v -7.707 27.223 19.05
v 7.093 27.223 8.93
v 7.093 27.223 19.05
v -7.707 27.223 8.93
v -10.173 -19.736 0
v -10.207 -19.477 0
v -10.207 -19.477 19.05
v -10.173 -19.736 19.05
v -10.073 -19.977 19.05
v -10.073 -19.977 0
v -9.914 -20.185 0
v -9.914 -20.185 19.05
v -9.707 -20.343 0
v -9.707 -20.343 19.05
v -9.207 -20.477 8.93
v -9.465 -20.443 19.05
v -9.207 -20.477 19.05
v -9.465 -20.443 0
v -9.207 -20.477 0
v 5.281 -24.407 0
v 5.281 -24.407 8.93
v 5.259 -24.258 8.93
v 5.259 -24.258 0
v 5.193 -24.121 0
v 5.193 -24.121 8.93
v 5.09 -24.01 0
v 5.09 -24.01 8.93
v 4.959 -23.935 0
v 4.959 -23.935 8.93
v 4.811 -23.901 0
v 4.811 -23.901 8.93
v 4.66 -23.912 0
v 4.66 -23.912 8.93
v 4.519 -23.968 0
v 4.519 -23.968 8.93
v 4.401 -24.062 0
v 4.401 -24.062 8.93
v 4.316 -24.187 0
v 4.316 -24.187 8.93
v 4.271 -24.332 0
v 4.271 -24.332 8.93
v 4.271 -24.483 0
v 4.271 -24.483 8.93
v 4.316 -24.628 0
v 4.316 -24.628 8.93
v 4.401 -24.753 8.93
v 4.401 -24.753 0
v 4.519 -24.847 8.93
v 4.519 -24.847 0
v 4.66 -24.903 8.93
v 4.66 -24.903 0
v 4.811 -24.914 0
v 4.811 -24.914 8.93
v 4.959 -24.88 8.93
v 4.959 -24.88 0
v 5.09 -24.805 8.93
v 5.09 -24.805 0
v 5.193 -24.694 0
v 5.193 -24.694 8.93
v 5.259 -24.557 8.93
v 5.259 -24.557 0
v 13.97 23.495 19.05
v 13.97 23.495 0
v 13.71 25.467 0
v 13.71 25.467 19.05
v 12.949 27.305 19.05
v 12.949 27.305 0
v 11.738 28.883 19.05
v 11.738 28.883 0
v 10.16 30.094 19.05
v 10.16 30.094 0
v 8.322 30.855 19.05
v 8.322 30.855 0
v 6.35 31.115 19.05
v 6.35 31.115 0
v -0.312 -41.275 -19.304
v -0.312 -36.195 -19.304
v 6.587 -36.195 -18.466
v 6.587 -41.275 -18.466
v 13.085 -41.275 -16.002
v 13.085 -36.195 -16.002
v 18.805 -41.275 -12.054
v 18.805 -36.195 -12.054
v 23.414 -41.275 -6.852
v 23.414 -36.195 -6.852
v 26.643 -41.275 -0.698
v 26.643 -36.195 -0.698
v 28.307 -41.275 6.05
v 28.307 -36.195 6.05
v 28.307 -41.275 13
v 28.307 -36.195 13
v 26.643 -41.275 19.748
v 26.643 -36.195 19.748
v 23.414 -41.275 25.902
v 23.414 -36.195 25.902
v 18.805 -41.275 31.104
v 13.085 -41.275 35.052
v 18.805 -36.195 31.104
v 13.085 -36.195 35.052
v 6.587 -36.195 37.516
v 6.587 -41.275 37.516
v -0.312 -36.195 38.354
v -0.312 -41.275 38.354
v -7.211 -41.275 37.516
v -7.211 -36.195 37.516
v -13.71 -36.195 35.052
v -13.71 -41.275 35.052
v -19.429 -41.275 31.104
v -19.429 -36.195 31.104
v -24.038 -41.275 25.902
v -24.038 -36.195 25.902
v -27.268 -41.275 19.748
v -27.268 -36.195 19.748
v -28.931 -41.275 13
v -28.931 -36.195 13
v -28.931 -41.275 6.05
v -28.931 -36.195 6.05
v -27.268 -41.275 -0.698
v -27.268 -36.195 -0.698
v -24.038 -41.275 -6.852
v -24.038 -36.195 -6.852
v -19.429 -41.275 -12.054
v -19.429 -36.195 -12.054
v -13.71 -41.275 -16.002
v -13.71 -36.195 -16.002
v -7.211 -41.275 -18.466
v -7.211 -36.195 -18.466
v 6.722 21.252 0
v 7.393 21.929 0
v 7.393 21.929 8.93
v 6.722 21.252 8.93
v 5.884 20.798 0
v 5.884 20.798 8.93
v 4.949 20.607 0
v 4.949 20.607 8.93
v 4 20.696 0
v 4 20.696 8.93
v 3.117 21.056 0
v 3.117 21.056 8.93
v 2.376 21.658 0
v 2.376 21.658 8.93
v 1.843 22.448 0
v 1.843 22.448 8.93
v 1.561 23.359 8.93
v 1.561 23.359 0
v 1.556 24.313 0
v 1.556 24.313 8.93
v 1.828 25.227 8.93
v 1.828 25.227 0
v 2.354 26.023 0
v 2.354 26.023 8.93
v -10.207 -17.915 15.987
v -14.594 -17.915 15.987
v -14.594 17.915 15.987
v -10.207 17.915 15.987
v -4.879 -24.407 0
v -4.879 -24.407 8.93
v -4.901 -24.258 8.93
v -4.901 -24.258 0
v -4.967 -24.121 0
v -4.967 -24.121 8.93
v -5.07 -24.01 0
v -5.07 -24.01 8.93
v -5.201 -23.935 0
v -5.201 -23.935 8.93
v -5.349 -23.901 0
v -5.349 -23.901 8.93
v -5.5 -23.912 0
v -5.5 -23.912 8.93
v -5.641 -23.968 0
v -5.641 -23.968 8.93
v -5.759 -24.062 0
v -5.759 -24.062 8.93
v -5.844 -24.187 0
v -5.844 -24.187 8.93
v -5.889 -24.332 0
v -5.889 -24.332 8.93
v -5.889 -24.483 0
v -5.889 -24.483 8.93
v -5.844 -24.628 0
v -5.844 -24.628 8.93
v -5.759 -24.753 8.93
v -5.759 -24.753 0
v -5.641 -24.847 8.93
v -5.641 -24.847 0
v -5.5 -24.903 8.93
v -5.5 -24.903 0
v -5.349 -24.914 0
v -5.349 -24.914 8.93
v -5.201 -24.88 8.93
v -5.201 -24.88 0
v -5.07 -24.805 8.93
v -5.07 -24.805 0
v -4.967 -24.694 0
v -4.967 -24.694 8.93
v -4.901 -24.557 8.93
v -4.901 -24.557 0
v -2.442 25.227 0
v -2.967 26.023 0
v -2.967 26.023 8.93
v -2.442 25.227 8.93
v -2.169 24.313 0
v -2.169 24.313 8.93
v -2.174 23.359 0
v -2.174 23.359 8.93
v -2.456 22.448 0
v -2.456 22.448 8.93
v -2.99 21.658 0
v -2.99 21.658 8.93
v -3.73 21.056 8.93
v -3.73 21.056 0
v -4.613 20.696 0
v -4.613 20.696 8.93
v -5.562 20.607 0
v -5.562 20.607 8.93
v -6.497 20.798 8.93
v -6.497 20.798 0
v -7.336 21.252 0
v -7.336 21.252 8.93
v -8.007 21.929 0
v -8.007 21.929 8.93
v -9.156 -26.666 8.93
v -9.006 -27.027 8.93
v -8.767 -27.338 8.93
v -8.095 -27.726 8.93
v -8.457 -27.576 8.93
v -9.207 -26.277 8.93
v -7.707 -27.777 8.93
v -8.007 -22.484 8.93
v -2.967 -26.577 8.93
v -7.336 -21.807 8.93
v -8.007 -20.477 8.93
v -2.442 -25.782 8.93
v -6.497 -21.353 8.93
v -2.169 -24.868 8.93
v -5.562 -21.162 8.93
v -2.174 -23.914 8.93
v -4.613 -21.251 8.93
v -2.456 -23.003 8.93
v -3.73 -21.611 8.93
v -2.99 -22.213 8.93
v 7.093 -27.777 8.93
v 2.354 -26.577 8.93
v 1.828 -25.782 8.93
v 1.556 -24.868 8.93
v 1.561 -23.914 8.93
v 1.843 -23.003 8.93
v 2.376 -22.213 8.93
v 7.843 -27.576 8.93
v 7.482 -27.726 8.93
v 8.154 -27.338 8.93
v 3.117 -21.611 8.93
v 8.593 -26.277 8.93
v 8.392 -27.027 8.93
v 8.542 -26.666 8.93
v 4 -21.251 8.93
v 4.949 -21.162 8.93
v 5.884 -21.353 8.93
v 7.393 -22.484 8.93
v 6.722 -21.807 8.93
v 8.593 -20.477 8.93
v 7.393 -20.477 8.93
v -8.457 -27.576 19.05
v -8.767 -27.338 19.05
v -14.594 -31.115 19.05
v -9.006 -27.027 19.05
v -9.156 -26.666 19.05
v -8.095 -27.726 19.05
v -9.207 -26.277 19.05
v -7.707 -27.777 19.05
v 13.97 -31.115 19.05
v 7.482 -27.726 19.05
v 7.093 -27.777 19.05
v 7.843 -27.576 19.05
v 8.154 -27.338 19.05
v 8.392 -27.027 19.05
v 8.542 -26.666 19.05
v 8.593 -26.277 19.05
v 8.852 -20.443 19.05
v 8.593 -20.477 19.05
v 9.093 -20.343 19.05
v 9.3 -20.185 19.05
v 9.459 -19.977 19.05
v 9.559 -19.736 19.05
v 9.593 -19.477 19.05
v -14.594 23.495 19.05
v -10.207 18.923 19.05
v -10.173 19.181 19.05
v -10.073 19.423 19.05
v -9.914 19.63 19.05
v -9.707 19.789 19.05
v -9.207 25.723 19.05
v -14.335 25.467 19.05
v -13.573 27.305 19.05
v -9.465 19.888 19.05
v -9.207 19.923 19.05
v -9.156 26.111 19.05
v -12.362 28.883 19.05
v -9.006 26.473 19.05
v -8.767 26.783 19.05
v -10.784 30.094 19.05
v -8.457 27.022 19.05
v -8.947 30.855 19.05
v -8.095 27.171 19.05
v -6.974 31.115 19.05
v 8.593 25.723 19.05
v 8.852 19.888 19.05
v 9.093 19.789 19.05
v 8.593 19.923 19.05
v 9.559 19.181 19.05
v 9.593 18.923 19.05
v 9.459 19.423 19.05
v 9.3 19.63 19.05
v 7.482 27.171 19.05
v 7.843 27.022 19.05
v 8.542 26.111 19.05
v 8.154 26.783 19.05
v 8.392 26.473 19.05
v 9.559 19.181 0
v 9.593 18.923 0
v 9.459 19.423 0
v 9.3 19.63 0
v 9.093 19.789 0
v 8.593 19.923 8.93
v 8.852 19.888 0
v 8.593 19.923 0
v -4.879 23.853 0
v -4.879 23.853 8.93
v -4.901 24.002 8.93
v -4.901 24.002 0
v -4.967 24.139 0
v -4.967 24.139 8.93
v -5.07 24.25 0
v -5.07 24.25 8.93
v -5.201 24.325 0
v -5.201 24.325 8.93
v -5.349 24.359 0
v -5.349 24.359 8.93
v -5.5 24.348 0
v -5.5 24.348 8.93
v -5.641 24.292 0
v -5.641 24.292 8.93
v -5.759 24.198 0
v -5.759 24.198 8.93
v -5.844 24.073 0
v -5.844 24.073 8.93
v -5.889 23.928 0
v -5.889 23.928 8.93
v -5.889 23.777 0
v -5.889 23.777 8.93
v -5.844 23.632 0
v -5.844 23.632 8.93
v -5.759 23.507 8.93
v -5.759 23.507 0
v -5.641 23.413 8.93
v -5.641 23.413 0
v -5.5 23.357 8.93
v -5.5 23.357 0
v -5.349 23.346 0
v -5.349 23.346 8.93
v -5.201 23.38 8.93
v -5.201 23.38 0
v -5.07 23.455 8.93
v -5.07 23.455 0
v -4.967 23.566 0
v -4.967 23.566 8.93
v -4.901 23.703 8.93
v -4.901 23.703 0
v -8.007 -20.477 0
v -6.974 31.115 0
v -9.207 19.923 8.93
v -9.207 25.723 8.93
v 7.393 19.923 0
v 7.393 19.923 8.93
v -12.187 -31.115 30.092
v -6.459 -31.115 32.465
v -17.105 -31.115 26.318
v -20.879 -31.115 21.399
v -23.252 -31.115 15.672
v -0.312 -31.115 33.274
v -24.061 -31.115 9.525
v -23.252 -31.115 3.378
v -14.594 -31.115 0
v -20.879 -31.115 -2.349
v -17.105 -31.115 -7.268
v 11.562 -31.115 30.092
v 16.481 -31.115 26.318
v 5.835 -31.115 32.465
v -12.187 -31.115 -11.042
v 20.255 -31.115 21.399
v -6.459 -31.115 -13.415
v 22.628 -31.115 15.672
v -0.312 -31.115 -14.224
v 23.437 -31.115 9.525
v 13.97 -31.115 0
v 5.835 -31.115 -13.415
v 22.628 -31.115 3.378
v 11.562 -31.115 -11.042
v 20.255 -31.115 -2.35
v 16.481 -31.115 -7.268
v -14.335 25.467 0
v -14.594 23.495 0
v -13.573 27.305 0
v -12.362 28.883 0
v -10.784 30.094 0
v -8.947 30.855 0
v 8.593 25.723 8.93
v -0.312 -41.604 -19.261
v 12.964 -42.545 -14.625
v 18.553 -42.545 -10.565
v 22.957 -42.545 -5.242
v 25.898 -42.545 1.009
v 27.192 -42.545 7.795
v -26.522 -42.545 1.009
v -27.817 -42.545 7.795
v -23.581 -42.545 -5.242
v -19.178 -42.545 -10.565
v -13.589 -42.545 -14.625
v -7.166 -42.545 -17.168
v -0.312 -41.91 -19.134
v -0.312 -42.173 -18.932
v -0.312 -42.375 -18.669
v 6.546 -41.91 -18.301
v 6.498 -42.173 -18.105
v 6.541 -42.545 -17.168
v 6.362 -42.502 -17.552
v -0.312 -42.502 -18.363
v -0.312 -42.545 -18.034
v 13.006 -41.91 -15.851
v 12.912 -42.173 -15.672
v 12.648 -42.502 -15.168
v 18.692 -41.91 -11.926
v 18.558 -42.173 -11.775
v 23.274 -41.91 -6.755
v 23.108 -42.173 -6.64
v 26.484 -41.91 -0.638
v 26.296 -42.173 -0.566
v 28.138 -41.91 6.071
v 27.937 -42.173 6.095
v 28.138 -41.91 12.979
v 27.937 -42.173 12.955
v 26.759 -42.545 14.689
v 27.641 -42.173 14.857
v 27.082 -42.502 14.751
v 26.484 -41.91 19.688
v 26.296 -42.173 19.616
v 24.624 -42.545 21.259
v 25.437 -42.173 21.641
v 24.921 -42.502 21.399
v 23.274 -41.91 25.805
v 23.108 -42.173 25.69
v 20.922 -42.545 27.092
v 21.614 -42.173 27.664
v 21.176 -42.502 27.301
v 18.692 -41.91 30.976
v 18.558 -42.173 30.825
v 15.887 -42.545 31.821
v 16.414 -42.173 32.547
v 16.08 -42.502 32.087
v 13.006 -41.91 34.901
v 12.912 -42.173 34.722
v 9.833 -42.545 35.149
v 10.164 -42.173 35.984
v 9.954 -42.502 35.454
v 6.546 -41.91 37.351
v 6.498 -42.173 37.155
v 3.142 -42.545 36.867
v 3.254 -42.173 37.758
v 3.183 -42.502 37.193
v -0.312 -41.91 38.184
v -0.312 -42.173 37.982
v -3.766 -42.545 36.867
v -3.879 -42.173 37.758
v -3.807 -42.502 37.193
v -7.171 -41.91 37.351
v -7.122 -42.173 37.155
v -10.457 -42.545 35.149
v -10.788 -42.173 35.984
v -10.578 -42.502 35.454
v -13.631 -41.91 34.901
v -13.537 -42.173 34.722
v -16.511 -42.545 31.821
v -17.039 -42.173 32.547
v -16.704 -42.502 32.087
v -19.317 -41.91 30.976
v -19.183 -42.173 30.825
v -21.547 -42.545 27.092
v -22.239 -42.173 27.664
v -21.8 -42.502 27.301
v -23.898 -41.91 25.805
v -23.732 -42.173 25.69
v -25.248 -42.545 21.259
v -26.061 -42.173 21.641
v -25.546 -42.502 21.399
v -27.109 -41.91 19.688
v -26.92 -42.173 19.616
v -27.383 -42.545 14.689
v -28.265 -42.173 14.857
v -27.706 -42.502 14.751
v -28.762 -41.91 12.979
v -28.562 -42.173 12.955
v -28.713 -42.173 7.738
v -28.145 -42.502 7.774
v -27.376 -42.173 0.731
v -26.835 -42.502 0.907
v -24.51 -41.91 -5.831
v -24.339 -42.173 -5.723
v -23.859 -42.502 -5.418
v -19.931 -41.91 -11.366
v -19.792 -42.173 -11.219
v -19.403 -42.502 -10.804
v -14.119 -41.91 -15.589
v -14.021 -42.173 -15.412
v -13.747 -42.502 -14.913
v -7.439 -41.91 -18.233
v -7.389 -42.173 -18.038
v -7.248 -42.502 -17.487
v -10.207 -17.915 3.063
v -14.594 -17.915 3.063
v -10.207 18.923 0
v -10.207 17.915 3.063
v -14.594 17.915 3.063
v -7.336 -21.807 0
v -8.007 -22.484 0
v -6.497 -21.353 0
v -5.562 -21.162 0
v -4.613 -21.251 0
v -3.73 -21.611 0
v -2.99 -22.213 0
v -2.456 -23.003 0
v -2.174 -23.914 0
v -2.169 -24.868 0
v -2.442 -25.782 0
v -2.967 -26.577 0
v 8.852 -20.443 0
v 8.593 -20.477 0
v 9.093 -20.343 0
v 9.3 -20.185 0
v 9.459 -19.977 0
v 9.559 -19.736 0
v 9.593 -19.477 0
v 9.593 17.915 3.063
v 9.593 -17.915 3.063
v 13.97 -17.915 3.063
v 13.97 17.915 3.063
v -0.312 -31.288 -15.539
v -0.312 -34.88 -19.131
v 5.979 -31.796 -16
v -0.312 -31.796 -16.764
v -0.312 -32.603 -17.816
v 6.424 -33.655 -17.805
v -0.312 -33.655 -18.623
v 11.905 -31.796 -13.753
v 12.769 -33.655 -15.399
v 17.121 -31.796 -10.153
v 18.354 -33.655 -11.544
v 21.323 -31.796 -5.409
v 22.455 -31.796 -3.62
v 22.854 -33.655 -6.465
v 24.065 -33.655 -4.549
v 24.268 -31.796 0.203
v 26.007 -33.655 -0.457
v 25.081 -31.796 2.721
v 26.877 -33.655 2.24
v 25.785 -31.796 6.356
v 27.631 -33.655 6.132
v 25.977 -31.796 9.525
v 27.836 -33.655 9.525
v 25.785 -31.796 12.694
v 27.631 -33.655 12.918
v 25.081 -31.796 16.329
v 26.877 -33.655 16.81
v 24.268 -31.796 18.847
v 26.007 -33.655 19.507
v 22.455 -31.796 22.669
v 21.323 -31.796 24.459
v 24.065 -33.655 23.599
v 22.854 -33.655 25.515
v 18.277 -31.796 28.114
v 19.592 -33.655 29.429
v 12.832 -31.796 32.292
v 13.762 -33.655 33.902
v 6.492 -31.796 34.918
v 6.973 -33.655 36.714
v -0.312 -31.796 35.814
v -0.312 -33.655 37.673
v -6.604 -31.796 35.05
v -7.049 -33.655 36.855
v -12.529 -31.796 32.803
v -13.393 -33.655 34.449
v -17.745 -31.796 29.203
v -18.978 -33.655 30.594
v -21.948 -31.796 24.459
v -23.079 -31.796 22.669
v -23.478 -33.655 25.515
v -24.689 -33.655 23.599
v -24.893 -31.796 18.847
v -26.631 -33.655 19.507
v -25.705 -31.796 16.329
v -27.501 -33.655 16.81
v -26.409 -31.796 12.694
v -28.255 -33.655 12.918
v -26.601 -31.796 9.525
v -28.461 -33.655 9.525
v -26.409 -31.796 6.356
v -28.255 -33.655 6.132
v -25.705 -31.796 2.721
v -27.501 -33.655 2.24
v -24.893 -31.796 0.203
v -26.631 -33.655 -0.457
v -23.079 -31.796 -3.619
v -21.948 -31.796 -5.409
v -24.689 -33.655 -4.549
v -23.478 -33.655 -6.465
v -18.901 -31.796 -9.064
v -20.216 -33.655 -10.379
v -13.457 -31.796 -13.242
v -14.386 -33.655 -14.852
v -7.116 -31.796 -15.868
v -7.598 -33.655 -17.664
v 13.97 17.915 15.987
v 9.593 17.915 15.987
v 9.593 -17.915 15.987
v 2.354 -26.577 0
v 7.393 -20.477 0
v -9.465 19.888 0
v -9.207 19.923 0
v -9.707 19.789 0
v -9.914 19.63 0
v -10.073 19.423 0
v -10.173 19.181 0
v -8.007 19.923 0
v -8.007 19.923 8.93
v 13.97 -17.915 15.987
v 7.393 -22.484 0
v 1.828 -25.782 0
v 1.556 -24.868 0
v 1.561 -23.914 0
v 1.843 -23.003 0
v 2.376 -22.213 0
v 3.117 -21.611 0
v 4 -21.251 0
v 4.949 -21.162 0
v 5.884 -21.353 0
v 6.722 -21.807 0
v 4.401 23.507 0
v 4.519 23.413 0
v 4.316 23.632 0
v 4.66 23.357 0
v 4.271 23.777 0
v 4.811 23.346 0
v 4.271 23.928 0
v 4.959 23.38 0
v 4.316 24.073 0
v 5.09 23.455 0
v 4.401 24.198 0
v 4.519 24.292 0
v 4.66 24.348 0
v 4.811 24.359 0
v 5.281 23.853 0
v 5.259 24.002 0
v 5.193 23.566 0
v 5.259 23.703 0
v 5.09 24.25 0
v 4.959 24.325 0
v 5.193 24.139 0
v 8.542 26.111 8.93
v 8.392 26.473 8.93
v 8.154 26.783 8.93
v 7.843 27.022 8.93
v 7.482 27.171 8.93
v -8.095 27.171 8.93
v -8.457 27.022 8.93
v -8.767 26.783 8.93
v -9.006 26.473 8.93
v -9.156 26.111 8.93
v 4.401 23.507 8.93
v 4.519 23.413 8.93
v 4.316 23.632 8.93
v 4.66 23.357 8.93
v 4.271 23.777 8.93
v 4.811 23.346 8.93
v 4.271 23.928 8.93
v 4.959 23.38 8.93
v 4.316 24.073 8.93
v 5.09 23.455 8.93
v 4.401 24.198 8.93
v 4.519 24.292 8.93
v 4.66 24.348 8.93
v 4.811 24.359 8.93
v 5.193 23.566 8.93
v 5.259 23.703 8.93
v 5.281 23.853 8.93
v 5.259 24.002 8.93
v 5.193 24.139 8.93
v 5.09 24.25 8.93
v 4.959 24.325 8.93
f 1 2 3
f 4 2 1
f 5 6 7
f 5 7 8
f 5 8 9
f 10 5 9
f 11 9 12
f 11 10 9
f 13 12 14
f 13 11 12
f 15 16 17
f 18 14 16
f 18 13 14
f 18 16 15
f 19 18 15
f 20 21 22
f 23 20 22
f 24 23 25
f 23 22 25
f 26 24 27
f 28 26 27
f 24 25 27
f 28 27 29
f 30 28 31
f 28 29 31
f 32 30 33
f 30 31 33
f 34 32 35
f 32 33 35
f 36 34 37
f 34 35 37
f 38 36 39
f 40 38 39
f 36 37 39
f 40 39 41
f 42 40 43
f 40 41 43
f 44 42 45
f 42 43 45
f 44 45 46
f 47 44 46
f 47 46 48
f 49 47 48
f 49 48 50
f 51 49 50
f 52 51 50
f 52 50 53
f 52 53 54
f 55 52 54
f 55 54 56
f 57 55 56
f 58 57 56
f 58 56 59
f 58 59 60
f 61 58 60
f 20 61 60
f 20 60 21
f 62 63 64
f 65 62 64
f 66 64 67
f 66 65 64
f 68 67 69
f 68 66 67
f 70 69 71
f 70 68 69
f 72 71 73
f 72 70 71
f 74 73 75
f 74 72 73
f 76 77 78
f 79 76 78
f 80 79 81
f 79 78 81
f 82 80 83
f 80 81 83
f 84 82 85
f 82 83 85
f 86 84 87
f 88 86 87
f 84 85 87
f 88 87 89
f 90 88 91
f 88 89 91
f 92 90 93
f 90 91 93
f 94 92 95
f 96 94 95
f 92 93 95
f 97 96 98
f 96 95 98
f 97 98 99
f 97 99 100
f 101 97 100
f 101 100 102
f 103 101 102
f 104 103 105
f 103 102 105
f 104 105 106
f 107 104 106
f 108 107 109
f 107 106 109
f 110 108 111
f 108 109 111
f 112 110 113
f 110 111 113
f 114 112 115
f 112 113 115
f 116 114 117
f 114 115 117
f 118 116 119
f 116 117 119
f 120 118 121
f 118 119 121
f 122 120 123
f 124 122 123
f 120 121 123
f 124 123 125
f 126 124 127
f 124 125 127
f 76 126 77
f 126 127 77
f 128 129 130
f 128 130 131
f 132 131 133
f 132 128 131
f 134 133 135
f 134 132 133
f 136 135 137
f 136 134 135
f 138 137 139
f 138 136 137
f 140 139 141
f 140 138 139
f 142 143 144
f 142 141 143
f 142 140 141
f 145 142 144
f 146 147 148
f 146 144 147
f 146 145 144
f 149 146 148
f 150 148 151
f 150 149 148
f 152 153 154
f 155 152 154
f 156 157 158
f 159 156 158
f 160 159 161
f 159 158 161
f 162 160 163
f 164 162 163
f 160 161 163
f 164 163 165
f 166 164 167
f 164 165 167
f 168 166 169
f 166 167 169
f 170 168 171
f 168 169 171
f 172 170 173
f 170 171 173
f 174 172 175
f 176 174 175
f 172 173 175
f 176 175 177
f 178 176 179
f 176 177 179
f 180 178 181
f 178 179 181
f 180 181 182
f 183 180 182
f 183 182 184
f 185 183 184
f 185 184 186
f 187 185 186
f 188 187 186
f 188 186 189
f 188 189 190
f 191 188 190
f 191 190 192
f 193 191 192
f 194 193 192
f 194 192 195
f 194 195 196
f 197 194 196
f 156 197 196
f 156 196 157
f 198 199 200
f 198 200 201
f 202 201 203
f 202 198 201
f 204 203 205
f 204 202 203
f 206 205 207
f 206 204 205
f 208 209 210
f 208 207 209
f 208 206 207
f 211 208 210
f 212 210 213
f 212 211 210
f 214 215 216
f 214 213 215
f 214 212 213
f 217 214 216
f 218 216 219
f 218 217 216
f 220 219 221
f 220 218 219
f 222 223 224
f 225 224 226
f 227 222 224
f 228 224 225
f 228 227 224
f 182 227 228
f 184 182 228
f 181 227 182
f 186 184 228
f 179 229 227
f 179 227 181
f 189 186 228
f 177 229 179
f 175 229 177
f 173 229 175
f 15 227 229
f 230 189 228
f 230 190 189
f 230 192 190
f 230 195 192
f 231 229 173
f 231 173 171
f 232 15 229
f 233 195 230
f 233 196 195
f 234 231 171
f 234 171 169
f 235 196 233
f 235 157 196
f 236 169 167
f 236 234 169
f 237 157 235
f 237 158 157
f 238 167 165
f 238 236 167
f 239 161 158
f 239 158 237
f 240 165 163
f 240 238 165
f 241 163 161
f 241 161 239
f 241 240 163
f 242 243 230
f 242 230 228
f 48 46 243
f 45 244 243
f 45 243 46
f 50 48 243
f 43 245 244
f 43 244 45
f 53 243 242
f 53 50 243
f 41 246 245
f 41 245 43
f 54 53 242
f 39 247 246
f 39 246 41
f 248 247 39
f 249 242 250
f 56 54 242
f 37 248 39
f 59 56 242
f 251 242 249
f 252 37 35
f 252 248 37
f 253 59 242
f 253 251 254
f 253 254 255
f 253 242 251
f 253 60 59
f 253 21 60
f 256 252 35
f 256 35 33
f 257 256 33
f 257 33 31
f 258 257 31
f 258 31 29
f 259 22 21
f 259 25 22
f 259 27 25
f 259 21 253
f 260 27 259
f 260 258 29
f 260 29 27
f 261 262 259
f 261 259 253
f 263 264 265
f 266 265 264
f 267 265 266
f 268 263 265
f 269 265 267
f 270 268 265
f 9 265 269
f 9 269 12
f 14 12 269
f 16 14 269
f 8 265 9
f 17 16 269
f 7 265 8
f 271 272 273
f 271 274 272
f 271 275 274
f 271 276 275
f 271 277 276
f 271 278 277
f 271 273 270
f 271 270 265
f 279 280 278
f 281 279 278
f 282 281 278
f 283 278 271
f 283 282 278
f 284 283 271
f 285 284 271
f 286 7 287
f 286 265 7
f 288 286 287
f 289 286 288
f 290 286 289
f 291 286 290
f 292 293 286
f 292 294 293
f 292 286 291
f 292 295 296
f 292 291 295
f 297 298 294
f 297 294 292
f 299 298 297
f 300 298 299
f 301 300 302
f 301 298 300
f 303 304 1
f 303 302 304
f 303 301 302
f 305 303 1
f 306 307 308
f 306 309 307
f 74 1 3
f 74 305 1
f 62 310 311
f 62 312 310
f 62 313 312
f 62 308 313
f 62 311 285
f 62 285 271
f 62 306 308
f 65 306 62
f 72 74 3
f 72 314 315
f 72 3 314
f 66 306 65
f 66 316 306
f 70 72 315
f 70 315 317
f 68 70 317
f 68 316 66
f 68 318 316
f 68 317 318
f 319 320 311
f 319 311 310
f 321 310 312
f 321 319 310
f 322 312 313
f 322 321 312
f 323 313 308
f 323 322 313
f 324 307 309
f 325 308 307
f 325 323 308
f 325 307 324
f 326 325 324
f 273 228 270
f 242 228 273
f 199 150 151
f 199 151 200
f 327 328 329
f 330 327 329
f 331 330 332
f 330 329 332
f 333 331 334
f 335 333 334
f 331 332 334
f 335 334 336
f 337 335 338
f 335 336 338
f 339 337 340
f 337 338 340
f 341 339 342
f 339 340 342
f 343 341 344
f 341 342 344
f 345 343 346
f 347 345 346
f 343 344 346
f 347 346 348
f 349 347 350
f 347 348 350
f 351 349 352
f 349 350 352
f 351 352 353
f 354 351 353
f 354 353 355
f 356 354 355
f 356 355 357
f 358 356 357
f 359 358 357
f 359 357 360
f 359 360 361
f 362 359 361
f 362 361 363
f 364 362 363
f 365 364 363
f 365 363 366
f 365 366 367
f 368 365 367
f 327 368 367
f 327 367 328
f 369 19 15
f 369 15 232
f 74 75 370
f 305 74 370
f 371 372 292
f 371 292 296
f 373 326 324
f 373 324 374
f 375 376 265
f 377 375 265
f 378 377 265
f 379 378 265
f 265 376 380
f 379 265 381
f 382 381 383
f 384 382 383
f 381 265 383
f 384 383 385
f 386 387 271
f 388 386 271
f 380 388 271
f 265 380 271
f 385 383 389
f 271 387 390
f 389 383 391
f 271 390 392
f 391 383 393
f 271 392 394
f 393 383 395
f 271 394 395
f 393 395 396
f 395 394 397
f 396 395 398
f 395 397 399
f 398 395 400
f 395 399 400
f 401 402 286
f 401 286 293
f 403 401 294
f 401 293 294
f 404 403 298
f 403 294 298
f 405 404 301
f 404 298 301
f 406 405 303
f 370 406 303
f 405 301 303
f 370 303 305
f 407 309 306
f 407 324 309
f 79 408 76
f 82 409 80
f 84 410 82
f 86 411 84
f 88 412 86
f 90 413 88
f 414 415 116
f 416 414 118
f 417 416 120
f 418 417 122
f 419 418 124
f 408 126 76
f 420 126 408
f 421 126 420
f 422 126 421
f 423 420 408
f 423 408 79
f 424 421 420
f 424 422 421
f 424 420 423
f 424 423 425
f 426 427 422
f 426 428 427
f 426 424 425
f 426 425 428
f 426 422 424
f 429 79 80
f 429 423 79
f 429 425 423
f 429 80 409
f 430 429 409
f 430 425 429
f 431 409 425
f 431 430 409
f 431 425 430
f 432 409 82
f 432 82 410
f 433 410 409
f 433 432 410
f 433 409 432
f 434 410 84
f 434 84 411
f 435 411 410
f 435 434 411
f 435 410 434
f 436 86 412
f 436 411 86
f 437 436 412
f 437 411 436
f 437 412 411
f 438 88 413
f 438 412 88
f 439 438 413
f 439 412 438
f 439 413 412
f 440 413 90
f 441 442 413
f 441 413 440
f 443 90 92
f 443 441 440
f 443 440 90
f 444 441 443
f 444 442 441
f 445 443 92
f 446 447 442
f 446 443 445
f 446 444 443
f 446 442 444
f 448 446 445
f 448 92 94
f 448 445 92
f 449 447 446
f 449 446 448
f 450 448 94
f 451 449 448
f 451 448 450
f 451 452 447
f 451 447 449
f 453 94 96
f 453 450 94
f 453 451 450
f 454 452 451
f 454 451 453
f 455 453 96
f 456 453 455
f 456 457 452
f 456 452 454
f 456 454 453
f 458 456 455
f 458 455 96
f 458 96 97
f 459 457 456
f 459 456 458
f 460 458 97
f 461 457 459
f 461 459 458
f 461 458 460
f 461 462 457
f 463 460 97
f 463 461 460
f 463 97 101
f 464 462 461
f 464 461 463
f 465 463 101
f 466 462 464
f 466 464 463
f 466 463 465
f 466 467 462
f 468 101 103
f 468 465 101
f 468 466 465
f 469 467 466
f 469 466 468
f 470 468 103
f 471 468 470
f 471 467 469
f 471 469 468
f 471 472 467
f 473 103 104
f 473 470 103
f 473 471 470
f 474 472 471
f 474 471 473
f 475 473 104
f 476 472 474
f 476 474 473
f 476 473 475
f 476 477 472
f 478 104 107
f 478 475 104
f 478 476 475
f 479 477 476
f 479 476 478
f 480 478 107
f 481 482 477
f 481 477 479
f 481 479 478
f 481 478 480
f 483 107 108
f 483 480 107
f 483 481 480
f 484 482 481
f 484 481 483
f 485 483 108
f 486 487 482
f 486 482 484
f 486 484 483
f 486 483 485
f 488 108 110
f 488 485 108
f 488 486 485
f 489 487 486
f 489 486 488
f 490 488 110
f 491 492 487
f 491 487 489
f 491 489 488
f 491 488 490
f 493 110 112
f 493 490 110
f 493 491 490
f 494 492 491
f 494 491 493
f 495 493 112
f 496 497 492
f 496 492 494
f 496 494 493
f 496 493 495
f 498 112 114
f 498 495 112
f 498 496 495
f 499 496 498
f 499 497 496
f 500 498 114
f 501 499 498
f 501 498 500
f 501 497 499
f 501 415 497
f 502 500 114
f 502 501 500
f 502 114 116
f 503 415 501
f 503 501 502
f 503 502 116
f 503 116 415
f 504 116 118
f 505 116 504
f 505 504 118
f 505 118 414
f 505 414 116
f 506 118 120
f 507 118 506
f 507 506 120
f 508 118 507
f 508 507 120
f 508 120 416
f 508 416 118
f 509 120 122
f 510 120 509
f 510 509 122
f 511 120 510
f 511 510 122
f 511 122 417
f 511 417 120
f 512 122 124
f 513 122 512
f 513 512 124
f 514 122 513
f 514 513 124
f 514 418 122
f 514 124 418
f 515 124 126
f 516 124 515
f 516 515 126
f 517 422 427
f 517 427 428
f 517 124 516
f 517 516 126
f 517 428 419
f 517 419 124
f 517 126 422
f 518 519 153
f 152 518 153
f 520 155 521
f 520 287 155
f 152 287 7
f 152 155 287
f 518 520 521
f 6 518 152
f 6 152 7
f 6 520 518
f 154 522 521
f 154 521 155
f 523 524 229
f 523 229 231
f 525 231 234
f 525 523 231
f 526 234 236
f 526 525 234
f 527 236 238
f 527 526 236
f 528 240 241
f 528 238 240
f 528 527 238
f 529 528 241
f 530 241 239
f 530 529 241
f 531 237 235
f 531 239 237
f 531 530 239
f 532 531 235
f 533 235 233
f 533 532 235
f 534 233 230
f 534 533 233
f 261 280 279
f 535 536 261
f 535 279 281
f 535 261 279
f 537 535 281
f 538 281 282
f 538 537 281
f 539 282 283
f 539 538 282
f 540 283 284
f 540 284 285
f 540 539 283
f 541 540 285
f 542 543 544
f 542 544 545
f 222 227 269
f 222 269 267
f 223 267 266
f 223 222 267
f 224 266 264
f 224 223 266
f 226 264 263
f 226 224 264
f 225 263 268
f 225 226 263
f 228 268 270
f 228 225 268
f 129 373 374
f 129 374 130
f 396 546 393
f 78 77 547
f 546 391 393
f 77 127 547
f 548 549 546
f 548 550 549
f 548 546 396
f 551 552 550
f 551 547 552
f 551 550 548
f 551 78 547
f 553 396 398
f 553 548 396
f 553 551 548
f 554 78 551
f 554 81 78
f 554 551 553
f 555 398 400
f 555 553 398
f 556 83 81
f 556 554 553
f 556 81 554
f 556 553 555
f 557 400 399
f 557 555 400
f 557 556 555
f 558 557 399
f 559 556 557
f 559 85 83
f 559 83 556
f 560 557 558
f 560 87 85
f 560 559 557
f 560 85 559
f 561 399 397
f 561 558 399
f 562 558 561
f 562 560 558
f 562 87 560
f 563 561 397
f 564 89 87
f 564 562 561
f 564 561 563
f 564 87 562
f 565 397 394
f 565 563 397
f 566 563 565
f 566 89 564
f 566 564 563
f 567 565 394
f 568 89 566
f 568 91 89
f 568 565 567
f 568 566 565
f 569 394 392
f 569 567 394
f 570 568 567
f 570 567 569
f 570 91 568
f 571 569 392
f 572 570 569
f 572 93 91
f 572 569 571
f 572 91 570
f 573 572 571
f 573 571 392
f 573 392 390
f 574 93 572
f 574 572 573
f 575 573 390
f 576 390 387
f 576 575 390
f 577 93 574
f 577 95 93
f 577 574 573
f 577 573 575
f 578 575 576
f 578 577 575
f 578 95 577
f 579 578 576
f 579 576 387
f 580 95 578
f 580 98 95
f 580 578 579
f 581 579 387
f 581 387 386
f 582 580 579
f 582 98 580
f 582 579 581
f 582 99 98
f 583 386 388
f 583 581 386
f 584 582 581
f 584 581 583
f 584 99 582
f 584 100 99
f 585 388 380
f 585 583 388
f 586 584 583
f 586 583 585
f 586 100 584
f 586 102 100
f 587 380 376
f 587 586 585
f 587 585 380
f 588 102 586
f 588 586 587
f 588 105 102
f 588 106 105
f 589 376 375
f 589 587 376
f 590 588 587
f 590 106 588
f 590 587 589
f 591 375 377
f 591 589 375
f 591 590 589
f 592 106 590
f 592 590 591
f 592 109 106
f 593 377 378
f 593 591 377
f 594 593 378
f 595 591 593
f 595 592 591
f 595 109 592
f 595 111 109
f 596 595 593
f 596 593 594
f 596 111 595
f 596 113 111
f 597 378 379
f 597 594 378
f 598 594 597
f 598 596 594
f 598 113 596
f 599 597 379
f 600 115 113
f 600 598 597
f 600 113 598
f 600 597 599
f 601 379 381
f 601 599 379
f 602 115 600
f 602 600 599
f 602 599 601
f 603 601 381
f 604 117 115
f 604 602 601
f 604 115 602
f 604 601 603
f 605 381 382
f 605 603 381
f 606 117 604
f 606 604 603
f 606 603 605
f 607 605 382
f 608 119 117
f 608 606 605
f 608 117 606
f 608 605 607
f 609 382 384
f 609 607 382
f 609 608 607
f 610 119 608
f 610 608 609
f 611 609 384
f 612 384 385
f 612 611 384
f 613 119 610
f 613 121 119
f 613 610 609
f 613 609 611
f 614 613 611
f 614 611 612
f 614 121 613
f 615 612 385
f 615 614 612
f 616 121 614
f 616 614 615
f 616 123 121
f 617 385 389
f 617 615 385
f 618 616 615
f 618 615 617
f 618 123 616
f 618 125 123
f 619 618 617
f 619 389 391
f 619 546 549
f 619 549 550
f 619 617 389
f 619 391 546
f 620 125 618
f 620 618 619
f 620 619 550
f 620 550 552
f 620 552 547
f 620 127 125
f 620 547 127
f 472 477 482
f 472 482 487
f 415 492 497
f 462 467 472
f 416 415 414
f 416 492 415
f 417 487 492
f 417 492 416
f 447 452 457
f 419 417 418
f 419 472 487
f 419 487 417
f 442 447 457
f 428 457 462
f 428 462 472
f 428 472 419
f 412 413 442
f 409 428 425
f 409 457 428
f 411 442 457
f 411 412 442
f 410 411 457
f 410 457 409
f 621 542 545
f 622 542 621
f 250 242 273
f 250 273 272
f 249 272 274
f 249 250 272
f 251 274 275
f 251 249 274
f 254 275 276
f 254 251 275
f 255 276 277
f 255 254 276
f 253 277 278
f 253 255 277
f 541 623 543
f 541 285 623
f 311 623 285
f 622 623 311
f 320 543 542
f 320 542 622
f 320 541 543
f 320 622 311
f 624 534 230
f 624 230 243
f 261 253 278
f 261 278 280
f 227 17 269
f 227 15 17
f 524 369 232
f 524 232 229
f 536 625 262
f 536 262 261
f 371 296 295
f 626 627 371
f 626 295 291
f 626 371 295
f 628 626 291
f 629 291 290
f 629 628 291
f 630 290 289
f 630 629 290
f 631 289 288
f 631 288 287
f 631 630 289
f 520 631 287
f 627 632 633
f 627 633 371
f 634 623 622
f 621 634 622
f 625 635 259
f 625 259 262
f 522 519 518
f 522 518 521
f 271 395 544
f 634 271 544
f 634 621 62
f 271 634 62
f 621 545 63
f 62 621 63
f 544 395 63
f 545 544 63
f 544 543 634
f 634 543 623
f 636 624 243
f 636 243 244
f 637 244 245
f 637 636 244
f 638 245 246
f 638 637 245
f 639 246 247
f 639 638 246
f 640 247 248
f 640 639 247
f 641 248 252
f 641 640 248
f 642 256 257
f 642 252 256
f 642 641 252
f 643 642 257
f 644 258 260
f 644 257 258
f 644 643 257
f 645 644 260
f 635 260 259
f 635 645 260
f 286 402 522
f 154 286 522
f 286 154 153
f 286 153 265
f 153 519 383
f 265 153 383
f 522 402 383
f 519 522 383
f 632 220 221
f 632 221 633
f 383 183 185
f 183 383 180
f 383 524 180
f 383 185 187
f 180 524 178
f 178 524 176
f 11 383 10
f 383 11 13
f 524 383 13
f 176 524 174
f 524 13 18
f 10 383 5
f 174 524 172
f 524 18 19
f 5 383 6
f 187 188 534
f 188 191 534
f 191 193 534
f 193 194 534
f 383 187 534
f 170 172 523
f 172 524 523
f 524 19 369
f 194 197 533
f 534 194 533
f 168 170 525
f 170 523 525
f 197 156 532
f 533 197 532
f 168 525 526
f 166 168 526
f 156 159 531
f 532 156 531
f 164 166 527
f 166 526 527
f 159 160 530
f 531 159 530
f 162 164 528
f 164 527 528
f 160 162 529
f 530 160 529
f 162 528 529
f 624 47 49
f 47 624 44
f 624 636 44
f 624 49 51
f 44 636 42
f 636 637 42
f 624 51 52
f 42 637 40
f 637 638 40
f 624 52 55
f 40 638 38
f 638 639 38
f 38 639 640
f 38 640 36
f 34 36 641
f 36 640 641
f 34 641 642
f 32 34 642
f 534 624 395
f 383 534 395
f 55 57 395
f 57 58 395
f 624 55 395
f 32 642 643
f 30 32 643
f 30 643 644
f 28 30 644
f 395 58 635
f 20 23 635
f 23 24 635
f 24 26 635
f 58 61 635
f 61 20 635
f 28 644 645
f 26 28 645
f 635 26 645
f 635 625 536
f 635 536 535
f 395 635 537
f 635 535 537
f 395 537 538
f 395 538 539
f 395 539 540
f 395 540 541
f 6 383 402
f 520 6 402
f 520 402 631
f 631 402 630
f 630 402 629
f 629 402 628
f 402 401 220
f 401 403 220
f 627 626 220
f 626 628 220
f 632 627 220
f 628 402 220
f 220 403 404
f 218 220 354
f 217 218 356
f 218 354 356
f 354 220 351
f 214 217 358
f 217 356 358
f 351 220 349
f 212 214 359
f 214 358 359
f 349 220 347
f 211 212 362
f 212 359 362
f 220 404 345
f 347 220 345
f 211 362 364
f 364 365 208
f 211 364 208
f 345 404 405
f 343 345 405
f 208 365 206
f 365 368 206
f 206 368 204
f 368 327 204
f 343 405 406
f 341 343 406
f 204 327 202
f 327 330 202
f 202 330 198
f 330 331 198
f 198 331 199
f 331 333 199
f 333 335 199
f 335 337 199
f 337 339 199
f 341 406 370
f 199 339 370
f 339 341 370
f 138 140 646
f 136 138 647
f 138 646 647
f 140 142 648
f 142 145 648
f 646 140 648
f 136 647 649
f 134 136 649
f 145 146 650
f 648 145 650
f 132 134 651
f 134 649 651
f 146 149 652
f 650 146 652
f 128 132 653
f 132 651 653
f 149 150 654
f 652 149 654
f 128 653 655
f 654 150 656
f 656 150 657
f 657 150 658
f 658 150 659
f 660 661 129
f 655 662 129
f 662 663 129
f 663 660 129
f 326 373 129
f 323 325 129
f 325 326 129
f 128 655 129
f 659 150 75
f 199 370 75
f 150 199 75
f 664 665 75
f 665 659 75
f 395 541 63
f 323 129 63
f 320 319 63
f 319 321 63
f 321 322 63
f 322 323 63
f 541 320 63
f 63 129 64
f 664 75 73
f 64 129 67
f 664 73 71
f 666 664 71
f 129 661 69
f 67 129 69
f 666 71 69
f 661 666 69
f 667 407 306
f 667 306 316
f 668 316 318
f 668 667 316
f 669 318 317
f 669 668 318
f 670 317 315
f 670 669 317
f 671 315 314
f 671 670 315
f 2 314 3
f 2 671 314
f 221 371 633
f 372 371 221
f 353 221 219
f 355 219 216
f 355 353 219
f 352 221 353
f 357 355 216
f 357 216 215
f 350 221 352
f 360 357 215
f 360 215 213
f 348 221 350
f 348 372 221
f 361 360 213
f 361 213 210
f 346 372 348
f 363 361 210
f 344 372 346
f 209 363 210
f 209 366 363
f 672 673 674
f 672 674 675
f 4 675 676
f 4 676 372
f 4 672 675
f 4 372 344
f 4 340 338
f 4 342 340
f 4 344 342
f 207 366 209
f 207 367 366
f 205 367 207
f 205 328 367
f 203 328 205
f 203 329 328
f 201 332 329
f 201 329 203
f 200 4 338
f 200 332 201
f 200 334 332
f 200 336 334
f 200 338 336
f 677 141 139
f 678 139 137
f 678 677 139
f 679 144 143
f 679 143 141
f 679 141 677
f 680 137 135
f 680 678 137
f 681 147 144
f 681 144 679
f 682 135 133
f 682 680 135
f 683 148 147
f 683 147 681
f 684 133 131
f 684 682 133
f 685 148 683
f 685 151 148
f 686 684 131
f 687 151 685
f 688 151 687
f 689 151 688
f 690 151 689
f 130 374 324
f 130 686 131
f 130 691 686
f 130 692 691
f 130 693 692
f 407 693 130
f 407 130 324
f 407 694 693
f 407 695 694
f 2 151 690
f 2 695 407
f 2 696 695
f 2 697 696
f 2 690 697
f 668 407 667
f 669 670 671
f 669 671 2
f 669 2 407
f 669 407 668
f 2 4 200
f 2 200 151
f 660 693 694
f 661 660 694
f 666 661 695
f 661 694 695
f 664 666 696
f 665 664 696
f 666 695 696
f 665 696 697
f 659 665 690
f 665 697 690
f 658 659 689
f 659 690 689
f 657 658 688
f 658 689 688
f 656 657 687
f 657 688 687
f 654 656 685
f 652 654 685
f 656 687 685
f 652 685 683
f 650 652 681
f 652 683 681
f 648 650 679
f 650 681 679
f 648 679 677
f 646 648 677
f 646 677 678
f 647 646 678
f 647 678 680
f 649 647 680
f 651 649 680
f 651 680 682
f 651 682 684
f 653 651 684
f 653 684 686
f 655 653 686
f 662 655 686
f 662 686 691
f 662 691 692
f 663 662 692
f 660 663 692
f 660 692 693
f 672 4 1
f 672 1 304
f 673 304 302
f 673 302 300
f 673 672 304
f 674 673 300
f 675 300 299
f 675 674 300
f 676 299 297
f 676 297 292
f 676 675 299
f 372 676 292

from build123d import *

# Parameters (mm, degrees)
BOSS_EXTRUDE1_DEPTH   = 19.05
SKETCH2_R             = 28.829
BOSS_EXTRUDE3_DEPTH   = 11.43
FILLET1_R             = 7.62
FILLET2_R             = 5.08
FILLET3_R             = 1.27
CAVITY4_OUTLINE_R     = 0.5
CAVITY4_DEPTH         = 19.05
CAVITY4_START         = 16.55
CAVITY4_2_OUTLINE_R   = 2.25
CAVITY4_2_OUTLINE_R_2 = 0.5
CAVITY4_2_DEPTH       = 2.5
CAVITY4_START_2       = 18.05
CAVITY4_3_DEPTH       = 1
CAVITY4_START_3       = 5.35
CAVITY4_4_OUTLINE_R   = 0.5
CAVITY4_4_DEPTH       = 11.2
CUT_EXTRUDE2_DEPTH    = 25.4
CUT_EXTRUDE3_START    = -19.558
CUT_EXTRUDE3_DEPTH    = 19.558
SKETCH6_R             = 2.25
BOSS_EXTRUDE4_DEPTH   = 2.54
SKETCH7_W             = 12.923913796
SKETCH7_H             = 35.830978878
CUT_EXTRUDE4_DEPTH    = 33.02
CUT_EXTRUDE6_START    = -5.08
SKETCH8_R             = 2.25
CUT_EXTRUDE6_DEPTH    = 5.08
SKETCH9_R             = 0.508
CUT_EXTRUDE7_DEPTH    = 17.78
CUT_EXTRUDE8_START    = -7.62
CUT_EXTRUDE8_DEPTH    = 7.62


# Read off the part's stored shape, not the designer's step: Cavity4
with BuildPart() as part:
    # Sketch1 → Boss-Extrude1 (new body)
    with BuildSketch(Plane.XY):
        Polygon((0, -31.115), (13.97, -31.115), (13.97, 0), (13.97, 31.115), (-0.624344695, 31.115), (-14.594344695, 31.115), (-14.594344695, 0), (-14.594344695, -31.115), align=None)
    extrude(amount=BOSS_EXTRUDE1_DEPTH)

    # Sketch2 → Boss-Extrude3 (add)
    with BuildSketch(Plane.XZ.offset(31.115)):
        with Locations(Location((-0.312172348, 9.525, 0), (0, 0, 270))):
            Circle(SKETCH2_R)
    extrude(amount=BOSS_EXTRUDE3_DEPTH)

    # Fillet1
    fillet1_edges = [part.edges().sort_by_distance(p)[0] for p in [
        (-14.594344695, 31.115, 9.525),
        (13.97, 31.115, 9.525),
    ]]
    fillet(fillet1_edges, radius=FILLET1_R)

    # Fillet2
    fillet2_edges = [part.edges().sort_by_distance(p)[0] for p in [
        (-0.312172348, -31.115, 38.354),
    ]]
    fillet(fillet2_edges, radius=FILLET2_R)

    # Fillet3
    fillet3_edges = [part.edges().sort_by_distance(p)[0] for p in [
        (-0.312172348, -42.545, 38.354),
    ]]
    fillet(fillet3_edges, radius=FILLET3_R)

    # Cavity4 outline → Cavity4 (cut)
    with BuildSketch(Plane.XY):
        with BuildLine():
            Line((8.593365051, 19.922544312), (-9.206634949, 19.922544312))
            ThreePointArc((-9.206634949, 19.922544312), (-9.91374173, 19.629651093), (-10.206634949, 18.922544312))
            Line((-10.206634949, 18.922544312), (-10.206634949, -19.477455688))
            ThreePointArc((-10.206634949, -19.477455688), (-9.91374173, -20.184562469), (-9.206634949, -20.477455688))
            Line((-9.206634949, -20.477455688), (8.593365051, -20.477455688))
            ThreePointArc((8.593365051, -20.477455688), (9.300471832, -20.184562469), (9.593365051, -19.477455688))
            Line((9.593365051, -19.477455688), (9.593365051, 18.922544312))
            ThreePointArc((9.593365051, 18.922544312), (9.300471832, 19.629651094), (8.593365051, 19.922544312))
        make_face()
        with Locations((-9.206634949, -19.477455688)):
            Circle(CAVITY4_OUTLINE_R, mode=Mode.SUBTRACT)
        with Locations((8.593365051, -19.477455688)):
            Circle(CAVITY4_OUTLINE_R, mode=Mode.SUBTRACT)
        with Locations((-9.206634949, 18.922544312)):
            Circle(CAVITY4_OUTLINE_R, mode=Mode.SUBTRACT)
        with Locations((8.593365051, 18.922544312)):
            Circle(CAVITY4_OUTLINE_R, mode=Mode.SUBTRACT)
    extrude(amount=CAVITY4_DEPTH, mode=Mode.SUBTRACT)

    # Cavity4 2 outline → Cavity4 2 (cut)
    # profile 1 of 6: a face of its own
    with BuildSketch(Plane.XY.offset(CAVITY4_START)):
        with BuildLine():
            ThreePointArc((-8.006634949, 21.929499851), (-3.337656866, 21.329809919), (-2.96721353, 26.022544312))
            Line((-2.96721353, 26.022544312), (2.353943633, 26.022544312))
            ThreePointArc((2.353943633, 26.022544312), (2.724386969, 21.329809919), (7.393365051, 21.929499851))
            Line((7.393365051, 21.929499851), (7.393365051, 19.922544312))
            Line((7.393365051, 19.922544312), (8.593365051, 19.922544312))
            Line((8.593365051, 19.922544312), (8.593365051, 25.722544312))
            ThreePointArc((8.593365051, 25.722544312), (8.154025223, 26.783204484), (7.093365051, 27.222544312))
            Line((7.093365051, 27.222544312), (-7.706634949, 27.222544312))
            ThreePointArc((-7.706634949, 27.222544312), (-8.76729512, 26.783204484), (-9.206634949, 25.722544312))
            Line((-9.206634949, 25.722544312), (-9.206634949, 19.922544312))
            Line((-9.206634949, 19.922544312), (-8.006634949, 19.922544312))
            Line((-8.006634949, 19.922544312), (-8.006634949, 21.929499851))
        make_face()
        with Locations((-5.386634949, 23.852544312)):
            Circle(CAVITY4_2_OUTLINE_R, mode=Mode.SUBTRACT)
        with Locations((4.773365051, 23.852544312)):
            Circle(CAVITY4_2_OUTLINE_R, mode=Mode.SUBTRACT)
    # profile 2 of 6: a face of its own
    with BuildSketch(Plane.XY.offset(CAVITY4_START)):
        with BuildLine():
            Line((-8.006634949, -20.477455688), (-9.206634949, -20.477455688))
            Line((-9.206634949, -20.477455688), (-9.206634949, -26.277455688))
            ThreePointArc((-9.206634949, -26.277455688), (-8.76729512, -27.33811586), (-7.706634949, -27.777455688))
            Line((-7.706634949, -27.777455688), (7.093365051, -27.777455688))
            ThreePointArc((7.093365051, -27.777455688), (8.154025223, -27.33811586), (8.593365051, -26.277455688))
            Line((8.593365051, -26.277455688), (8.593365051, -20.477455688))
            Line((8.593365051, -20.477455688), (7.393365051, -20.477455688))
            Line((7.393365051, -20.477455688), (7.393365051, -22.484411227))
            ThreePointArc((7.393365051, -22.484411227), (2.724386969, -21.884721295), (2.353943633, -26.577455688))
            Line((2.353943633, -26.577455688), (-2.96721353, -26.577455688))
            ThreePointArc((-2.96721353, -26.577455688), (-3.337656866, -21.884721295), (-8.006634949, -22.484411227))
            Line((-8.006634949, -22.484411227), (-8.006634949, -20.477455688))
        make_face()
        with Locations((-5.386634949, -24.407455688)):
            Circle(CAVITY4_2_OUTLINE_R, mode=Mode.SUBTRACT)
        with Locations((4.773365051, -24.407455688)):
            Circle(CAVITY4_2_OUTLINE_R, mode=Mode.SUBTRACT)
    # profile 3 of 6: a face of its own
    with BuildSketch(Plane.XY.offset(CAVITY4_START)):
        with Locations((-9.206634949, -19.477455688)):
            Circle(CAVITY4_2_OUTLINE_R_2)
    # profile 4 of 6: a face of its own
    with BuildSketch(Plane.XY.offset(CAVITY4_START)):
        with Locations((-9.206634949, 18.922544312)):
            Circle(CAVITY4_2_OUTLINE_R_2)
    # profile 5 of 6: a face of its own
    with BuildSketch(Plane.XY.offset(CAVITY4_START)):
        with Locations((8.593365051, 18.922544312)):
            Circle(CAVITY4_2_OUTLINE_R_2)
    # profile 6 of 6: a face of its own
    with BuildSketch(Plane.XY.offset(CAVITY4_START)):
        with Locations((8.593365051, -19.477455688)):
            Circle(CAVITY4_2_OUTLINE_R_2)
    extrude(amount=CAVITY4_2_DEPTH, mode=Mode.SUBTRACT)

    # Cavity4 3 outline → Cavity4 3 (cut)
    with BuildSketch(Plane.XY.offset(CAVITY4_START_2)):
        with BuildLine():
            Line((2.353943633, 26.022544312), (-2.96721353, 26.022544312))
            ThreePointArc((-2.96721353, 26.022544312), (-3.337656866, 21.329809919), (-8.006634949, 21.929499851))
            Line((-8.006634949, 21.929499851), (-8.006634949, 19.922544312))
            Line((-8.006634949, 19.922544312), (7.393365051, 19.922544312))
            Line((7.393365051, 19.922544312), (7.393365051, 21.929499851))
            ThreePointArc((7.393365051, 21.929499851), (2.724386969, 21.329809919), (2.353943633, 26.022544312))
        make_face()
        with BuildLine():
            Line((7.393365051, -20.477455688), (-8.006634949, -20.477455688))
            Line((-8.006634949, -20.477455688), (-8.006634949, -22.484411227))
            ThreePointArc((-8.006634949, -22.484411227), (-3.337656866, -21.884721295), (-2.96721353, -26.577455688))
            Line((-2.96721353, -26.577455688), (2.353943633, -26.577455688))
            ThreePointArc((2.353943633, -26.577455688), (2.724386969, -21.884721295), (7.393365051, -22.484411227))
            Line((7.393365051, -22.484411227), (7.393365051, -20.477455688))
        make_face()
    extrude(amount=CAVITY4_3_DEPTH, mode=Mode.SUBTRACT)

    # Cavity4 4 outline → Cavity4 4 (cut)
    with BuildSketch(Plane.XY.offset(CAVITY4_START_3)):
        with Locations((-9.206634949, -19.477455688)):
            Circle(CAVITY4_4_OUTLINE_R)
        with Locations((-9.206634949, 18.922544312)):
            Circle(CAVITY4_4_OUTLINE_R)
        with Locations((8.593365051, 18.922544312)):
            Circle(CAVITY4_4_OUTLINE_R)
        with Locations((8.593365051, -19.477455688)):
            Circle(CAVITY4_4_OUTLINE_R)
    extrude(amount=CAVITY4_4_DEPTH, mode=Mode.SUBTRACT)

    # Sketch4 → Cut-Extrude2 (cut)
    with BuildSketch(Plane.XY.offset(19.05)):
        Polygon((-9.79576072, 19.507329281), (9.123068143, 19.507329281), (9.123068143, -20.023079802), (-9.743960735, -20.023079802), align=None)
    extrude(amount=-CUT_EXTRUDE2_DEPTH, mode=Mode.SUBTRACT)

    # Sketch5 → Cut-Extrude3 (cut)
    with BuildSketch(Plane.XY.offset(18.05).offset(CUT_EXTRUDE3_START)):
        with BuildLine():
            Line((7.393365051, -20.477455688), (-8.006634949, -20.477455688))
            Line((-8.006634949, -20.477455688), (-8.006634949, -22.484411227))
            ThreePointArc((-8.006634949, -22.484411227), (-3.337656866, -21.884721295), (-2.96721353, -26.577455688))
            Line((-2.96721353, -26.577455688), (2.353943633, -26.577455688))
            ThreePointArc((2.353943633, -26.577455688), (2.724386969, -21.884721295), (7.393365051, -22.484411227))
            Line((7.393365051, -22.484411227), (7.393365051, -20.477455688))
        make_face()
        with BuildLine():
            Line((2.353943633, 26.022544312), (-2.96721353, 26.022544312))
            ThreePointArc((-2.96721353, 26.022544312), (-3.337656866, 21.329809919), (-8.006634949, 21.929499851))
            Line((-8.006634949, 21.929499851), (-8.006634949, 19.922544312))
            Line((-8.006634949, 19.922544312), (7.393365051, 19.922544312))
            Line((7.393365051, 19.922544312), (7.393365051, 21.929499851))
            ThreePointArc((7.393365051, 21.929499851), (2.724386969, 21.329809919), (2.353943633, 26.022544312))
        make_face()
    extrude(amount=CUT_EXTRUDE3_DEPTH, mode=Mode.SUBTRACT)

    # Sketch6 → Boss-Extrude4 (add)
    with BuildSketch(Plane.XY.offset(19.05)):
        with Locations(Location((4.773365051, -24.407455688, 0), (0, 0, 180))):
            Circle(SKETCH6_R)
        with Locations(Location((-5.386634949, -24.407455688, 0), (0, 0, 180))):
            Circle(SKETCH6_R)
        with Locations(Location((4.773365051, 23.852544312, 0), (0, 0, 180))):
            Circle(SKETCH6_R)
        with Locations(Location((-5.386634949, 23.852544312, 0), (0, 0, 180))):
            Circle(SKETCH6_R)
    extrude(amount=BOSS_EXTRUDE4_DEPTH)

    # Sketch7 → Cut-Extrude4 (cut)
    with BuildSketch(Plane.ZY.offset(14.594344695)):
        with Locations((9.525, 0)):
            Rectangle(SKETCH7_W, SKETCH7_H)
    extrude(amount=-CUT_EXTRUDE4_DEPTH, mode=Mode.SUBTRACT)

    # Sketch8 → Cut-Extrude6 (cut)
    with BuildSketch(Plane.XY.offset(21.59).offset(CUT_EXTRUDE6_START)):
        with Locations((4.773365051, -24.407455688)):
            Circle(SKETCH8_R)
        with Locations((4.773365051, 23.852544312)):
            Circle(SKETCH8_R)
        with Locations((-5.386634949, 23.852544312)):
            Circle(SKETCH8_R)
        with Locations((-5.386634949, -24.407455688)):
            Circle(SKETCH8_R)
    extrude(amount=CUT_EXTRUDE6_DEPTH, mode=Mode.SUBTRACT)

    # Sketch9 → Cut-Extrude7 (cut)
    with BuildSketch(Plane.XY.offset(16.51)):
        with Locations((-5.386634949, 23.852544312)):
            Circle(SKETCH9_R)
        with Locations((4.773365051, 23.852544312)):
            Circle(SKETCH9_R)
        with Locations((4.773365051, -24.407455688)):
            Circle(SKETCH9_R)
        with Locations((-5.386634949, -24.407455688)):
            Circle(SKETCH9_R)
    extrude(amount=-CUT_EXTRUDE7_DEPTH, mode=Mode.SUBTRACT)

    # Sketch10 → Cut-Extrude8 (cut)
    with BuildSketch(Plane.XY.offset(16.55).offset(CUT_EXTRUDE8_START)):
        with BuildLine():
            Line((-7.706634949, -27.777455688), (7.093365051, -27.777455688))
            ThreePointArc((7.093365051, -27.777455688), (8.154025223, -27.33811586), (8.593365051, -26.277455688))
            Line((8.593365051, -26.277455688), (8.593365051, -20.477455688))
            Line((8.593365051, -20.477455688), (7.393365051, -20.477455688))
            Line((7.393365051, -20.477455688), (7.393365051, -22.484411227))
            ThreePointArc((7.393365051, -22.484411227), (2.724386969, -21.884721295), (2.353943633, -26.577455688))
            Line((2.353943633, -26.577455688), (-2.96721353, -26.577455688))
            ThreePointArc((-2.96721353, -26.577455688), (-3.337656866, -21.884721295), (-8.006634949, -22.484411227))
            Line((-8.006634949, -22.484411227), (-8.006634949, -20.477455688))
            Line((-8.006634949, -20.477455688), (-9.206634949, -20.477455688))
            Line((-9.206634949, -20.477455688), (-9.206634949, -26.277455688))
            ThreePointArc((-9.206634949, -26.277455688), (-8.76729512, -27.33811586), (-7.706634949, -27.777455688))
        make_face()
        with BuildLine():
            Line((7.393365051, 21.929499851), (7.393365051, 19.922544312))
            Line((7.393365051, 19.922544312), (8.593365051, 19.922544312))
            Line((8.593365051, 19.922544312), (8.593365051, 25.722544312))
            ThreePointArc((8.593365051, 25.722544312), (8.154025223, 26.783204484), (7.093365051, 27.222544312))
            Line((7.093365051, 27.222544312), (-7.706634949, 27.222544312))
            ThreePointArc((-7.706634949, 27.222544312), (-8.76729512, 26.783204484), (-9.206634949, 25.722544312))
            Line((-9.206634949, 25.722544312), (-9.206634949, 19.922544312))
            Line((-9.206634949, 19.922544312), (-8.006634949, 19.922544312))
            Line((-8.006634949, 19.922544312), (-8.006634949, 21.929499851))
            ThreePointArc((-8.006634949, 21.929499851), (-3.337656866, 21.329809919), (-2.96721353, 26.022544312))
            Line((-2.96721353, 26.022544312), (2.353943633, 26.022544312))
            ThreePointArc((2.353943633, 26.022544312), (2.724386969, 21.329809919), (7.393365051, 21.929499851))
        make_face()
    extrude(amount=CUT_EXTRUDE8_DEPTH, mode=Mode.SUBTRACT)


solid = part.part
